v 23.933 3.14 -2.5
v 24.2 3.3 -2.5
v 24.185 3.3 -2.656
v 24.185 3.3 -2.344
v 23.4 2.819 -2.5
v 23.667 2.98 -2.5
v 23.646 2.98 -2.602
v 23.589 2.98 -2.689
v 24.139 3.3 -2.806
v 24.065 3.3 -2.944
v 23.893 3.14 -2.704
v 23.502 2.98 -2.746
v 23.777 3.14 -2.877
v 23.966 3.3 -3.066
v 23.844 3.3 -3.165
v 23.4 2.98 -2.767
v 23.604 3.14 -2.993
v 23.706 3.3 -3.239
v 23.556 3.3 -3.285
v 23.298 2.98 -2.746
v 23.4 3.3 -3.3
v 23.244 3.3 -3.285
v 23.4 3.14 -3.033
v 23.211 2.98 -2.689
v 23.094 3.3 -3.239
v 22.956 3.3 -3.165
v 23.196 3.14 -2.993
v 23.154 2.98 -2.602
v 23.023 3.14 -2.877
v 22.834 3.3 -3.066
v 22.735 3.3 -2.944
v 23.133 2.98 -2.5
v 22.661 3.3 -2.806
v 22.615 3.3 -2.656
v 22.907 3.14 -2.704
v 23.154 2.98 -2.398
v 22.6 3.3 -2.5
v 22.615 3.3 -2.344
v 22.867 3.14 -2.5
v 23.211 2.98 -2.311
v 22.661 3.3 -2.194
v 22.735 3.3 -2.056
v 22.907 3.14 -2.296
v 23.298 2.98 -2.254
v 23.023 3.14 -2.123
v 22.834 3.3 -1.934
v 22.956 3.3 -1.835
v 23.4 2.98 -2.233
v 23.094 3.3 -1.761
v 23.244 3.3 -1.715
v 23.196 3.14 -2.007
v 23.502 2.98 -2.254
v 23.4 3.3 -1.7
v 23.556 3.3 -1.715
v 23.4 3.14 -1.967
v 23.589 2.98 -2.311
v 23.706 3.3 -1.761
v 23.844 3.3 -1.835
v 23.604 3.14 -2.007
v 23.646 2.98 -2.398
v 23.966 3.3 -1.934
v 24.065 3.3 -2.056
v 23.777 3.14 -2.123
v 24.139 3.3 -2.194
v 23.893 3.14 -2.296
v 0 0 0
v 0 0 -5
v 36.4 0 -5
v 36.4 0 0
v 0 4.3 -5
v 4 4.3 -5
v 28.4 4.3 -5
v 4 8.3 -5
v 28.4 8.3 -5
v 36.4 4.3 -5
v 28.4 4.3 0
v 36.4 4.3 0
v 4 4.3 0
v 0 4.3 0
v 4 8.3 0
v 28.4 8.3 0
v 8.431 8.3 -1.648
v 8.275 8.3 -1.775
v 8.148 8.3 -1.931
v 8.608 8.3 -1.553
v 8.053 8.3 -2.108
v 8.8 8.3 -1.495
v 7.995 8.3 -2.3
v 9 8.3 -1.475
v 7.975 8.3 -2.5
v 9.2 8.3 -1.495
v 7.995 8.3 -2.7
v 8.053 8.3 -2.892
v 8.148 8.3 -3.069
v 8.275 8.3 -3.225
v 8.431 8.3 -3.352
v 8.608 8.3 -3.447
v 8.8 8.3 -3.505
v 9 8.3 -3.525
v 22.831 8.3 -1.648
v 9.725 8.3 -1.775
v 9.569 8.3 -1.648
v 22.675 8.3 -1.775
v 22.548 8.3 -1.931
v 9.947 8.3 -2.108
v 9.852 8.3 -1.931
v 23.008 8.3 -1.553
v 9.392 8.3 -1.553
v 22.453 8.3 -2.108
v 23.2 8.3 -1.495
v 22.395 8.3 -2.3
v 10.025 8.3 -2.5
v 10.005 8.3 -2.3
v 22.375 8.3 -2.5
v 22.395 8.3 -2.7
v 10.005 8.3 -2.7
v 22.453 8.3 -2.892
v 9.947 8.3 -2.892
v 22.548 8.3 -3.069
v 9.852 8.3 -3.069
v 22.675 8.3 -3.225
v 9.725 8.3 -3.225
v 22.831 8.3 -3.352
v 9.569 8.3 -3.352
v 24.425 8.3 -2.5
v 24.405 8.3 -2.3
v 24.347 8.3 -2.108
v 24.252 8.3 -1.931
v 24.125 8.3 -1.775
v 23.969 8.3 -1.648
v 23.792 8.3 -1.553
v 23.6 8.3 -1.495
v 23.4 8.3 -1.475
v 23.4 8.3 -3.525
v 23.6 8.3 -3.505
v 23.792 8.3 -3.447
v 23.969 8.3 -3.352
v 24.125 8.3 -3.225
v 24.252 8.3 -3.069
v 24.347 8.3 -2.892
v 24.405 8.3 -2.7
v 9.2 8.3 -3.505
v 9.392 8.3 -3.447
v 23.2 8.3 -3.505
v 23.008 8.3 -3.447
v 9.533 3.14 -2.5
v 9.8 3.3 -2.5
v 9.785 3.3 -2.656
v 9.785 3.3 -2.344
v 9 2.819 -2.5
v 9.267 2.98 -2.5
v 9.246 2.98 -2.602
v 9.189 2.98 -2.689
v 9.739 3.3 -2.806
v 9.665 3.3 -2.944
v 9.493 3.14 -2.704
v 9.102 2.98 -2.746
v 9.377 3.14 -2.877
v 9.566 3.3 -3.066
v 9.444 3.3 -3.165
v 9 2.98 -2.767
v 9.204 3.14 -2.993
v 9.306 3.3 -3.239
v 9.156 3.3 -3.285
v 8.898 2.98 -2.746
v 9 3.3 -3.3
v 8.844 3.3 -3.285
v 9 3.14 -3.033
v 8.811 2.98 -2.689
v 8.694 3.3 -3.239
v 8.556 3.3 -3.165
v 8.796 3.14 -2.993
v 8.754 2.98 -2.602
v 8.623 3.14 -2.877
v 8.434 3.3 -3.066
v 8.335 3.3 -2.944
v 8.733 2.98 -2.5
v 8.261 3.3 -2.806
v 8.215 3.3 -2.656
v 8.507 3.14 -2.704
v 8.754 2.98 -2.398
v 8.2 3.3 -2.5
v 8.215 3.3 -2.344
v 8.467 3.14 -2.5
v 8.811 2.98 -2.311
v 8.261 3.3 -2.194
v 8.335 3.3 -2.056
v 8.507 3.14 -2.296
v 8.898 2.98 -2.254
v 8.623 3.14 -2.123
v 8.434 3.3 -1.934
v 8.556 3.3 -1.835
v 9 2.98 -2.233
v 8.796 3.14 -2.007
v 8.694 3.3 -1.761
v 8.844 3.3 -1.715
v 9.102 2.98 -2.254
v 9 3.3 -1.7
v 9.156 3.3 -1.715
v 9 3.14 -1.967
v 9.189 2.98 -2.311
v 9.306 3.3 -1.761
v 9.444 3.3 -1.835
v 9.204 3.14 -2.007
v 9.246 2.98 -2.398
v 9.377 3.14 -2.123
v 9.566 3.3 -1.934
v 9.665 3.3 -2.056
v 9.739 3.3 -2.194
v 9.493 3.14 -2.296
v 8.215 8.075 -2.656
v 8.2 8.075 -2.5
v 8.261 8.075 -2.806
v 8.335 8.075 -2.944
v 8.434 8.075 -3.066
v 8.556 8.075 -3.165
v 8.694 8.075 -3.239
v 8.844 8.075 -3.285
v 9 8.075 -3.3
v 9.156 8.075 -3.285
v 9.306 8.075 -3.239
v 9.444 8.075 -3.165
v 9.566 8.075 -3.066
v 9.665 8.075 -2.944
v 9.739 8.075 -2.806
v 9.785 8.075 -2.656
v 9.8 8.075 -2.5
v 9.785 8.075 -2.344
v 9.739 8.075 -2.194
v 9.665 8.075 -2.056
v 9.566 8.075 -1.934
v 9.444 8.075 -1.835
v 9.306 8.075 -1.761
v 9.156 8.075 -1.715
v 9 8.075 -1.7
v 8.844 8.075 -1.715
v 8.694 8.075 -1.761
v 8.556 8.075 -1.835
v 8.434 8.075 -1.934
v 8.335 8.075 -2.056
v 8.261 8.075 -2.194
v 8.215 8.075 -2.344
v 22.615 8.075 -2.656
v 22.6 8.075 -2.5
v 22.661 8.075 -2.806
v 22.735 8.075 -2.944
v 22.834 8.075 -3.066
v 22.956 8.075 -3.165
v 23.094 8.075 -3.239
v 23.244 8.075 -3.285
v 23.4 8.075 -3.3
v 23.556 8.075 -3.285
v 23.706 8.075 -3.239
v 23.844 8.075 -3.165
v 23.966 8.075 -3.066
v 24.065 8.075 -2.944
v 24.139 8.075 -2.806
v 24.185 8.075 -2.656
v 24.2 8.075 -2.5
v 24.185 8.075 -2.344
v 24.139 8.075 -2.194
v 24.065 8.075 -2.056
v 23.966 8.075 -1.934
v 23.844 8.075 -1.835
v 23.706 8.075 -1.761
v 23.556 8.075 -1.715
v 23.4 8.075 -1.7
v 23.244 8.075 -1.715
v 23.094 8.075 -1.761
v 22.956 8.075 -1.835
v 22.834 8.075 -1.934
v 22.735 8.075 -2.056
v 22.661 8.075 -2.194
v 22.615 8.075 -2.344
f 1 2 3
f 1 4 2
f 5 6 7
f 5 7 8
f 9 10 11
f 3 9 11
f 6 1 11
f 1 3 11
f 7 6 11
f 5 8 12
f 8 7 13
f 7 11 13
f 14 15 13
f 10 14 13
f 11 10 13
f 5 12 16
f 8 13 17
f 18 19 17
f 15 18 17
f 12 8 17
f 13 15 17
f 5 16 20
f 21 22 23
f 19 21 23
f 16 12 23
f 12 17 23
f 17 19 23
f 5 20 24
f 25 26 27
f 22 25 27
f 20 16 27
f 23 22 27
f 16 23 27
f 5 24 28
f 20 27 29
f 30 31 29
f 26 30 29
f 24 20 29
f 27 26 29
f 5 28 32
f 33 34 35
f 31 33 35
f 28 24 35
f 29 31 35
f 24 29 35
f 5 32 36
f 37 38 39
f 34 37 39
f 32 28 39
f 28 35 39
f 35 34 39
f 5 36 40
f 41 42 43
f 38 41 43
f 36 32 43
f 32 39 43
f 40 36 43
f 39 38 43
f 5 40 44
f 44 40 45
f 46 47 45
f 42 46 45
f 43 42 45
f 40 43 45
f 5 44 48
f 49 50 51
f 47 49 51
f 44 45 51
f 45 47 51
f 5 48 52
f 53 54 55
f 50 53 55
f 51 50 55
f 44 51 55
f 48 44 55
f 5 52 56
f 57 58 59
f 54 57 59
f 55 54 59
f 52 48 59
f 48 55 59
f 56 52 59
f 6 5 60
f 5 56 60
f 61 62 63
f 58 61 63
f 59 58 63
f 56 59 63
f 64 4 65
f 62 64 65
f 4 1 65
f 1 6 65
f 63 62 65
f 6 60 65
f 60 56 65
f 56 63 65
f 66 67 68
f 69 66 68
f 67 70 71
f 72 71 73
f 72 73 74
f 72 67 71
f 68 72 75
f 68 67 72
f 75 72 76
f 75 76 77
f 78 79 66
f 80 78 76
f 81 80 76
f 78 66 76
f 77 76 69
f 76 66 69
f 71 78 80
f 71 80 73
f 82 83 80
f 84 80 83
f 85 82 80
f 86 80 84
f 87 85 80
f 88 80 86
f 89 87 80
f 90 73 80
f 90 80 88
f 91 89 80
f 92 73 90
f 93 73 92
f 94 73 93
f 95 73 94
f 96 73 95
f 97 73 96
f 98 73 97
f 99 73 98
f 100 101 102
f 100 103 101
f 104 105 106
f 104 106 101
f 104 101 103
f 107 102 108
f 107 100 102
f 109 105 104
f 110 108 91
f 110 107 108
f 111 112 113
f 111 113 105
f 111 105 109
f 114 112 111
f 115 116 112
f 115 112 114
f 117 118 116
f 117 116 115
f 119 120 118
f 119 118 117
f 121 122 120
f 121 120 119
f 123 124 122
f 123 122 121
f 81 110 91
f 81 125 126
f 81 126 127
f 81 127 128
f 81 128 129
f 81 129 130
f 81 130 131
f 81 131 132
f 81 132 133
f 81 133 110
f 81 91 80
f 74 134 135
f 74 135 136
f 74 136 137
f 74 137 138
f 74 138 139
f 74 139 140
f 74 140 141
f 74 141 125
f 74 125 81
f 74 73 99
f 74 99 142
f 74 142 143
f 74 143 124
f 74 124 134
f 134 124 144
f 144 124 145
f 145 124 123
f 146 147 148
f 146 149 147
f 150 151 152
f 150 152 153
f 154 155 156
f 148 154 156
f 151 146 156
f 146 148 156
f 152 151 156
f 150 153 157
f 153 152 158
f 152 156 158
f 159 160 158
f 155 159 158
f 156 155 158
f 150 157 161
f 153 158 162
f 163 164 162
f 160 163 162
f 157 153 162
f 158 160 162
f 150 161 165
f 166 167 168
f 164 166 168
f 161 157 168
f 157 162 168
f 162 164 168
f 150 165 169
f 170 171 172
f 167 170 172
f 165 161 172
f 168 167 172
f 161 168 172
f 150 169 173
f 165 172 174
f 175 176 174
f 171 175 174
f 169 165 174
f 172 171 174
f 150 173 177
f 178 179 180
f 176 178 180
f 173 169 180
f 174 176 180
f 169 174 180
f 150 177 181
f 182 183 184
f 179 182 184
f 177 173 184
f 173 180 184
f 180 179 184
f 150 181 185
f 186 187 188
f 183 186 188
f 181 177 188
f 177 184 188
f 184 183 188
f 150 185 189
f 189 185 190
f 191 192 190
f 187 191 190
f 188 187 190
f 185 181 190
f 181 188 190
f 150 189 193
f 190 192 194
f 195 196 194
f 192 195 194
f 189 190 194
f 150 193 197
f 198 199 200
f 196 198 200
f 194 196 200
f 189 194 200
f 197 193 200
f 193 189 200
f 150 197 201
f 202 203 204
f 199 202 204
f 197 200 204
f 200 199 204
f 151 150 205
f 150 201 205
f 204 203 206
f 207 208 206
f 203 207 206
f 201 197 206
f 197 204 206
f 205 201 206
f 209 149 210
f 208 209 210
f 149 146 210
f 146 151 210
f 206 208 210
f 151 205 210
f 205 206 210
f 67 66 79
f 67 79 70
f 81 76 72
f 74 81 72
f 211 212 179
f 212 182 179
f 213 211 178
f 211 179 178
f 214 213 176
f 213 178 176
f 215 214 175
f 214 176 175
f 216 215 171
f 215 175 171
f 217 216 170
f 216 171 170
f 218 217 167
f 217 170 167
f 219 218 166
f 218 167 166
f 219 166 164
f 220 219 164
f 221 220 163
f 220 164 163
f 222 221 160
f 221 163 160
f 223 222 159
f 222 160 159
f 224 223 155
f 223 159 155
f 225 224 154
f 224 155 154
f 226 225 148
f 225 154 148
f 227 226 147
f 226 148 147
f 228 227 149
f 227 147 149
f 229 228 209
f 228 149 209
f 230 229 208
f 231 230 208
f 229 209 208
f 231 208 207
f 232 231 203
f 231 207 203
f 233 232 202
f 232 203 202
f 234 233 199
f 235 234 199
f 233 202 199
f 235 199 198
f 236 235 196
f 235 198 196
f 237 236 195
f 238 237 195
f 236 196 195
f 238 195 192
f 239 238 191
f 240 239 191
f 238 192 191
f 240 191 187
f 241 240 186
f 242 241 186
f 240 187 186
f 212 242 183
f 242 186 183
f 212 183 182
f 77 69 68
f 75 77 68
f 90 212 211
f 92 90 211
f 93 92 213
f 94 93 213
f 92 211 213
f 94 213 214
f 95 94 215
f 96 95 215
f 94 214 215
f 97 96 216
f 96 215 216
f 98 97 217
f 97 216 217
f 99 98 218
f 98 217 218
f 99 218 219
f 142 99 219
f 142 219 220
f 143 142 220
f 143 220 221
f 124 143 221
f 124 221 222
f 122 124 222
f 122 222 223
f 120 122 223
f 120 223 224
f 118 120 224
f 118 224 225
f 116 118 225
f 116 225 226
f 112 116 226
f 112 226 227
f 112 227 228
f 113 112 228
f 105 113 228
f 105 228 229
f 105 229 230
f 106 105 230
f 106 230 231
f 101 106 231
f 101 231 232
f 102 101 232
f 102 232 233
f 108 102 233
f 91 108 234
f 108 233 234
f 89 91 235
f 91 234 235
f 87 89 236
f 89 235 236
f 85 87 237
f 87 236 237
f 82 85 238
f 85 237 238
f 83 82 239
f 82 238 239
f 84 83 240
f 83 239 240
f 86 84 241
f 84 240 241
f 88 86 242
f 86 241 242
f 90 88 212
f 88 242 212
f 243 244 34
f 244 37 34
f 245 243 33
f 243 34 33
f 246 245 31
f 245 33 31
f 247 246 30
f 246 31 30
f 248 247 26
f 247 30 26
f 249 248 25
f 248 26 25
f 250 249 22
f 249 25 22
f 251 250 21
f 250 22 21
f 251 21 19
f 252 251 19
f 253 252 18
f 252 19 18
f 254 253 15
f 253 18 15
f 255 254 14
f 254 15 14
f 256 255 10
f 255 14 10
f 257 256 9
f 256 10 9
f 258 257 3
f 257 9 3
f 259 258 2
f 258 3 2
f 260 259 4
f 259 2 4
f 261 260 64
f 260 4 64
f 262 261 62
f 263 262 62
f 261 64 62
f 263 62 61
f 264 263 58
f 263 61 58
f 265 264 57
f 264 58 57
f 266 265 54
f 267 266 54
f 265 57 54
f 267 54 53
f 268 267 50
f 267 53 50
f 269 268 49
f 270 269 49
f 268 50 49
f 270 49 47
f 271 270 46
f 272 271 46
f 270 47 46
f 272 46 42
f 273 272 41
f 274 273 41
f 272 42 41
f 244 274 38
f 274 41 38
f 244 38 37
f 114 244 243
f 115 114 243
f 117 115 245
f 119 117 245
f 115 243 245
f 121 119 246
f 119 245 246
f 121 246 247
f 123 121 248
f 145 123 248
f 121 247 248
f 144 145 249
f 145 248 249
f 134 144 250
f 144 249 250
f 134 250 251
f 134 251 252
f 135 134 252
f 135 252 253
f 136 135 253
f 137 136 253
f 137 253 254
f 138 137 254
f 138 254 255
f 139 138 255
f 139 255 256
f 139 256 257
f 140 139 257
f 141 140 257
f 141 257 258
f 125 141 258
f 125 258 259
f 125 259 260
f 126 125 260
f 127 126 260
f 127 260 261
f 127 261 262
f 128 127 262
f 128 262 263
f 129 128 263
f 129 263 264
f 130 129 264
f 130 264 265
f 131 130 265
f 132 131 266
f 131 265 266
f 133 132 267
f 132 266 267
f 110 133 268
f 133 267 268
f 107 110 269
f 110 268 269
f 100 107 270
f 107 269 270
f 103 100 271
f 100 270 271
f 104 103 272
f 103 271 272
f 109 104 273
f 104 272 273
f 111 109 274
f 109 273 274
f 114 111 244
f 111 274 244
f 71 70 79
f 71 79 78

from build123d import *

# Parameters (mm, degrees)
SKETCH2_W                       = 36.4
SKETCH2_H                       = 5
BOSS_EXTRUDE1_DEPTH             = 4.3
SKETCH3_W                       = 24.4
SKETCH3_H                       = 5
BOSS_EXTRUDE2_DEPTH             = 4
M2X0_4_TAPPED_HOLE1_D           = 1.6
M2X0_4_TAPPED_HOLE1_DEPTH       = 5
M2X0_4_TAPPED_HOLE1_CSINK_D     = 2.05
M2X0_4_TAPPED_HOLE1_CSINK_ANGLE = 90
M2X0_4_TAPPED_HOLE1_TIP         = 0.480688495


with BuildPart() as part:
    # Sketch2 → Boss-Extrude1 (new body)
    with BuildSketch(Plane(origin=(0, 0, 0), x_dir=(1, 0, 0), z_dir=(0, 1, 0))):
        with Locations((18.2, 2.5)):
            Rectangle(SKETCH2_W, SKETCH2_H)
    extrude(amount=BOSS_EXTRUDE1_DEPTH)

    # Sketch3 → Boss-Extrude2 (add)
    with BuildSketch(Plane(origin=(0, 4.3, 0), x_dir=(1, 0, 0), z_dir=(0, 1, 0))):
        with Locations((16.2, 2.5)):
            Rectangle(SKETCH3_W, SKETCH3_H)
    extrude(amount=BOSS_EXTRUDE2_DEPTH)

    # M2x0.4 Tapped Hole1
    with Locations(Plane(origin=(0, 8.3, 0), x_dir=(1, 0, 0), z_dir=(0, 1, 0))):
        with Locations((9, 2.5), (23.4, 2.5)):
            CounterSinkHole(M2X0_4_TAPPED_HOLE1_D / 2, M2X0_4_TAPPED_HOLE1_CSINK_D / 2, depth=M2X0_4_TAPPED_HOLE1_DEPTH, counter_sink_angle=M2X0_4_TAPPED_HOLE1_CSINK_ANGLE)
            with Locations((0, 0, -(M2X0_4_TAPPED_HOLE1_DEPTH + M2X0_4_TAPPED_HOLE1_TIP / 2))):  # 118° drill point
                Cone(0, M2X0_4_TAPPED_HOLE1_D / 2, M2X0_4_TAPPED_HOLE1_TIP, mode=Mode.SUBTRACT)


solid = part.part
